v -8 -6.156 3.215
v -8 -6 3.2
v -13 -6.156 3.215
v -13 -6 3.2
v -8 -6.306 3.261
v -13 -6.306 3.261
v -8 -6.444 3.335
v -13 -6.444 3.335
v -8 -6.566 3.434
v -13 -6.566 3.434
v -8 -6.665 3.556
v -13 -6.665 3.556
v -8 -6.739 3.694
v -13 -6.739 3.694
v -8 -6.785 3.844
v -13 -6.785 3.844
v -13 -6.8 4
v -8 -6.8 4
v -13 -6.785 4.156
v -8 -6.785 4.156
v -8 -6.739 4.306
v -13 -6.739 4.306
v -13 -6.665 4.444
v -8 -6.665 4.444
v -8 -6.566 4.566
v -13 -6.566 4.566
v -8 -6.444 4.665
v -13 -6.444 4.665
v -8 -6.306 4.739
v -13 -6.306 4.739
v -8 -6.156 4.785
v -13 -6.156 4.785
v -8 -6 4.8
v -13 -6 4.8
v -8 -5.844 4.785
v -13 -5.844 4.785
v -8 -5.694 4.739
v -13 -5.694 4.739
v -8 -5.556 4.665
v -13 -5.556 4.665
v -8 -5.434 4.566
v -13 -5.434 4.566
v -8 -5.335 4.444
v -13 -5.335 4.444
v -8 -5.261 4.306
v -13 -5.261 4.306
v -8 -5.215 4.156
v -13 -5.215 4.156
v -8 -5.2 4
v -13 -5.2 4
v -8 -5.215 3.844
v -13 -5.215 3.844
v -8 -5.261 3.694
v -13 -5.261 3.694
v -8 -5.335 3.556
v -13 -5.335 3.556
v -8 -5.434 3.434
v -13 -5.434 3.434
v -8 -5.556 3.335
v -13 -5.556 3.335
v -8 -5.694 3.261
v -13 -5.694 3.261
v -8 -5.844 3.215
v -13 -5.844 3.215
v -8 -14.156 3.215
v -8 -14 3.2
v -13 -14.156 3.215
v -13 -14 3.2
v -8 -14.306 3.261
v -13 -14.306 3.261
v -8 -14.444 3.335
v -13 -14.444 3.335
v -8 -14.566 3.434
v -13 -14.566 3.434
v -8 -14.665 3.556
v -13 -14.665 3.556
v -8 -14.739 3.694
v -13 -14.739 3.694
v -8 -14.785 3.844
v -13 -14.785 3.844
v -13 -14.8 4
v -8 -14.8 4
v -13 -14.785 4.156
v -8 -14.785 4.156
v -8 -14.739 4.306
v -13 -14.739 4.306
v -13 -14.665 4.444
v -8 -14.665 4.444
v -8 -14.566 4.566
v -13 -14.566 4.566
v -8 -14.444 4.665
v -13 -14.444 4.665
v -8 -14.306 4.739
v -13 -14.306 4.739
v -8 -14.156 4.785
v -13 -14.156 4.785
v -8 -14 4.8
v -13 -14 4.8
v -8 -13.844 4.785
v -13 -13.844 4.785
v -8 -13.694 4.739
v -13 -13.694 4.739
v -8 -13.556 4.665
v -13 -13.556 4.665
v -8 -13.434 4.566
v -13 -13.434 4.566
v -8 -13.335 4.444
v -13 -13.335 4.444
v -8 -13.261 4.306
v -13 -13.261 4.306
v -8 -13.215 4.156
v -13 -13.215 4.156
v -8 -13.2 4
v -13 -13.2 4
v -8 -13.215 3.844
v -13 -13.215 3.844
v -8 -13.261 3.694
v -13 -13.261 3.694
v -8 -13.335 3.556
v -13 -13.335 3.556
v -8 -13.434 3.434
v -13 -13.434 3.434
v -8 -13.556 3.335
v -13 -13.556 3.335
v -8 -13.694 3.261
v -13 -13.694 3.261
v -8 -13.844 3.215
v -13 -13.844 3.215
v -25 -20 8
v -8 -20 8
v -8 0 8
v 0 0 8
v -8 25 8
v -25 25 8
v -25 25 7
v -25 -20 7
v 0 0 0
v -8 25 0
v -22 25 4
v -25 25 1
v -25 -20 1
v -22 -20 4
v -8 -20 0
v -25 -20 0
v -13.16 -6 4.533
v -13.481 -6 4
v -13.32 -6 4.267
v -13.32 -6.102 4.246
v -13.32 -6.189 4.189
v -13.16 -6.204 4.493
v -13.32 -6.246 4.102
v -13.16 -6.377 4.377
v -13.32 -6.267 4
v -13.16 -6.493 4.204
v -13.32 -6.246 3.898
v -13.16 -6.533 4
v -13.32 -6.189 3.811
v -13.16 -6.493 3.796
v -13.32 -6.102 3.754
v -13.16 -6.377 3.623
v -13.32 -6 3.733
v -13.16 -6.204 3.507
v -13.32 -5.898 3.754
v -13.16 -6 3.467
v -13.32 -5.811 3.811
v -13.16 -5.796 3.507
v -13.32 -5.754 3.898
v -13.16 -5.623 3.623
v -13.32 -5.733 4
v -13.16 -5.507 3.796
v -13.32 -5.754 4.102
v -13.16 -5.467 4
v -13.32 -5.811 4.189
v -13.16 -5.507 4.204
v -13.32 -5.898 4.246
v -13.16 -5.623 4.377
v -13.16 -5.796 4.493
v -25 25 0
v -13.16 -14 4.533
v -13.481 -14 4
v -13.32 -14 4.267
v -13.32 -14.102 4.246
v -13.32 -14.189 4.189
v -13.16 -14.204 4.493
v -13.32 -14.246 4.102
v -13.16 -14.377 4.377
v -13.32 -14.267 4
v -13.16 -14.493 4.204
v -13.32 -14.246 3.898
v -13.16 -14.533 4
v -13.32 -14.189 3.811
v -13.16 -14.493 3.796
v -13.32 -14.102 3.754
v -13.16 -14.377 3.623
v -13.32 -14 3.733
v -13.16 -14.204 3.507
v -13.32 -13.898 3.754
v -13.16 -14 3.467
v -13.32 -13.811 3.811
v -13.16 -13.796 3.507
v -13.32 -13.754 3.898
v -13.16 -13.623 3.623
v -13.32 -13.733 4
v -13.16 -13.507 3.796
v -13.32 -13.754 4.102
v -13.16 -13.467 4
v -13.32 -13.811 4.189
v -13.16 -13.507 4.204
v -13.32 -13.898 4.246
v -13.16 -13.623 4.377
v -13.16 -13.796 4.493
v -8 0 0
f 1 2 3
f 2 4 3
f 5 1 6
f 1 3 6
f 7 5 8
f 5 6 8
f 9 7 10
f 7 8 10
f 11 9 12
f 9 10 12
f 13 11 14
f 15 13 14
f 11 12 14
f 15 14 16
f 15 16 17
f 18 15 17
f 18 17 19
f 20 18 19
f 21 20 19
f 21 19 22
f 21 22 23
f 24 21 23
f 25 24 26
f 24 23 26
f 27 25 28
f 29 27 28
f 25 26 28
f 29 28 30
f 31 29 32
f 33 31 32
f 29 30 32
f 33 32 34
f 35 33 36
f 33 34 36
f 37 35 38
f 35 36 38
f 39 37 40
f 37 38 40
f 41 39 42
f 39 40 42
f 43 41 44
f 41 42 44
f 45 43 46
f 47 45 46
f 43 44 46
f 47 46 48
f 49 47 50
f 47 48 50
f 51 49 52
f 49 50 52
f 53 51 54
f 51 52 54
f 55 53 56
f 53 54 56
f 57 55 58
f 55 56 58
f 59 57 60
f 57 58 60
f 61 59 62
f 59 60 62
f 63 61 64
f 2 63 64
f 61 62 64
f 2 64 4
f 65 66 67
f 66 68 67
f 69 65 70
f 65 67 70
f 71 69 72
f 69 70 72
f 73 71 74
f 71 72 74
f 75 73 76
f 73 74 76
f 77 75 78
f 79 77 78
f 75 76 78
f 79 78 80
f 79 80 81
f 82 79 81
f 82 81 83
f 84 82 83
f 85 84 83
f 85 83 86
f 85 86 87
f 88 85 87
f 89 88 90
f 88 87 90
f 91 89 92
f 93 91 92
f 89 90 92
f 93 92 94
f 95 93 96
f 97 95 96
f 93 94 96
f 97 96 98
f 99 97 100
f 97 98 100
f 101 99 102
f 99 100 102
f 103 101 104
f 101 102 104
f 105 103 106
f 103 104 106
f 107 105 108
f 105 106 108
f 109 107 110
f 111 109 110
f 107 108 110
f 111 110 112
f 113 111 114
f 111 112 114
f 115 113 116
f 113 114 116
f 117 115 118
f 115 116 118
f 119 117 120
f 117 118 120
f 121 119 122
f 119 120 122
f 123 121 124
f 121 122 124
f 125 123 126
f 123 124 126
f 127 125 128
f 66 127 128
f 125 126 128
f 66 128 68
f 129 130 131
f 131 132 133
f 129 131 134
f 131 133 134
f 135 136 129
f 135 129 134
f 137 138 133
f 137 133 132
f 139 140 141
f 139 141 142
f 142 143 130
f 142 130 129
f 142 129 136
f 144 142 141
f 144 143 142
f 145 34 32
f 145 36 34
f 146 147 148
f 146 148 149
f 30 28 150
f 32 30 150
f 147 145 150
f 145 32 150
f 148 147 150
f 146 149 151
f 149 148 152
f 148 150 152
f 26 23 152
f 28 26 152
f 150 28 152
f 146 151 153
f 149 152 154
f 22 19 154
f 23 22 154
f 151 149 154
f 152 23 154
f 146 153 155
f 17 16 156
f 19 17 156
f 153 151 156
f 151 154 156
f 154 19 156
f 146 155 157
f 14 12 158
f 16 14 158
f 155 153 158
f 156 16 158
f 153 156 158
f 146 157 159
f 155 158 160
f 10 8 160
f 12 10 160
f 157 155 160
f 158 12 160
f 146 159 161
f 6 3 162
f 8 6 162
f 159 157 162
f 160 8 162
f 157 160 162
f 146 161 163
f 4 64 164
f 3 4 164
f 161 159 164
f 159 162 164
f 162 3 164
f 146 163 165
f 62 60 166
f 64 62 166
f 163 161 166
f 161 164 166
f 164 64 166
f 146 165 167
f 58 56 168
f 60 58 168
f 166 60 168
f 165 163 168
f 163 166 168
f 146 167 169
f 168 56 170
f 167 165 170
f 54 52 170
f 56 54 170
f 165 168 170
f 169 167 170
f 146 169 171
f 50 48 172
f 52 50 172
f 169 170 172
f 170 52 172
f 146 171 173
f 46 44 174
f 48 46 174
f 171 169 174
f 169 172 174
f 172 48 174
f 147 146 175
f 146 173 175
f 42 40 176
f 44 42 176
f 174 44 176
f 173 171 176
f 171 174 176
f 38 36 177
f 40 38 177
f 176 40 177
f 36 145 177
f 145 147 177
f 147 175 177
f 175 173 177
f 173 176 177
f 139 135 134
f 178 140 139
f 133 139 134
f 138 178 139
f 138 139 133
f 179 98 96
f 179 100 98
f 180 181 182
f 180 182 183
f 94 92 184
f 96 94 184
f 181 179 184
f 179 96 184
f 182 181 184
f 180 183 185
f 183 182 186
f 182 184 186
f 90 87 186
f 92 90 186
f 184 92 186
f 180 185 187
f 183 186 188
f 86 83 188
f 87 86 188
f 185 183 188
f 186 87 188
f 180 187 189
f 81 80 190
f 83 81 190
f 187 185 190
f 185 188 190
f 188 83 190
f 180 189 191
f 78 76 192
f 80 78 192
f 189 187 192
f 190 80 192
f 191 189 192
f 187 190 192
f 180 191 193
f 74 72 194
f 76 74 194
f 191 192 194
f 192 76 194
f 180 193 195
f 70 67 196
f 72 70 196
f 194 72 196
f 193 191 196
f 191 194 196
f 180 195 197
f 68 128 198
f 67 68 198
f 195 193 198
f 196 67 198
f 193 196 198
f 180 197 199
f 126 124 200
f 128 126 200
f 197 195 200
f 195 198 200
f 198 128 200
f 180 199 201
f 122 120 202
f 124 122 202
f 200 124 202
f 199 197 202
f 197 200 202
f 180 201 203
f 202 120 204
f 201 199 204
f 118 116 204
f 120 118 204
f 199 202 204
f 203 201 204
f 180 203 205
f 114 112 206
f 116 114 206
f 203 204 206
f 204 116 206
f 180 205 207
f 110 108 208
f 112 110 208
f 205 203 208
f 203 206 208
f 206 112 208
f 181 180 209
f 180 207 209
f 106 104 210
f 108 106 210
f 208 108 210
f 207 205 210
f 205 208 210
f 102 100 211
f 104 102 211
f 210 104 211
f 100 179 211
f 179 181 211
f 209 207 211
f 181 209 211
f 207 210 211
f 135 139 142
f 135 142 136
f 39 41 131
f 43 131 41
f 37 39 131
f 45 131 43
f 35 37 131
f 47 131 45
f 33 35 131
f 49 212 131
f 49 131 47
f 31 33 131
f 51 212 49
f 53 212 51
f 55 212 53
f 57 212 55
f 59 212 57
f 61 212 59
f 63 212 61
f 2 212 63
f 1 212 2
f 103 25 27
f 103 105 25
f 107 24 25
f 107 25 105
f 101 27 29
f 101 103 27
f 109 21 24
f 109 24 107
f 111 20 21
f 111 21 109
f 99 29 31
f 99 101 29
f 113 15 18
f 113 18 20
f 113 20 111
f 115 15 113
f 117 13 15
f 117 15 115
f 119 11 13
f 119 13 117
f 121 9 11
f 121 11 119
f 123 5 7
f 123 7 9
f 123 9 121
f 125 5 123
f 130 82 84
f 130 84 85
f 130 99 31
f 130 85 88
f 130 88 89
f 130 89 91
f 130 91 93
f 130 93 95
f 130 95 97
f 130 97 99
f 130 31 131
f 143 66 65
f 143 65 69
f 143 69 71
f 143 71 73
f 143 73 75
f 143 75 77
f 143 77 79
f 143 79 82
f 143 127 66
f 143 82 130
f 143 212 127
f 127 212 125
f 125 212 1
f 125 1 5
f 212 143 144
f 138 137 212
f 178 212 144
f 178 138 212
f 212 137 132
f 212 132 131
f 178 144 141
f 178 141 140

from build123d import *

# Parameters (mm, degrees)
BOSS_EXTRUDE1_DEPTH       = 8
CUT_EXTRUDE1_DEPTH        = 46
M2X0_4_TAPPED_HOLE1_D     = 1.6
M2X0_4_TAPPED_HOLE1_DEPTH = 5
M2X0_4_TAPPED_HOLE1_TIP   = 0.480688495


with BuildPart() as part:
    # Sketch1 → Boss-Extrude1 (new body)
    with BuildSketch(Plane.XY):
        Polygon((0, 0), (-8, 0), (-8, -20), (-25, -20), (-25, 25), (-8, 25), align=None)
    extrude(amount=BOSS_EXTRUDE1_DEPTH)

    # Sketch2 → Cut-Extrude1 (cut, through all)
    with BuildSketch(Plane(origin=(0, 25, 0), x_dir=(1, 0, 0), z_dir=(0, 1, 0))):
        Polygon((-25, -4), (-25, -1), (-22, -4), (-25, -7), align=None)
    extrude(amount=-CUT_EXTRUDE1_DEPTH, mode=Mode.SUBTRACT)

    # M2x0.4 Tapped Hole1
    with Locations(Plane(origin=(-8, -6, 4), x_dir=(0, 0, 1), z_dir=(1, 0, 0))):
        with Locations((0, 0), (0, 8)):
            Hole(M2X0_4_TAPPED_HOLE1_D / 2, depth=M2X0_4_TAPPED_HOLE1_DEPTH)
            with Locations((0, 0, -(M2X0_4_TAPPED_HOLE1_DEPTH + M2X0_4_TAPPED_HOLE1_TIP / 2))):  # 118° drill point
                Cone(0, M2X0_4_TAPPED_HOLE1_D / 2, M2X0_4_TAPPED_HOLE1_TIP, mode=Mode.SUBTRACT)


solid = part.part
